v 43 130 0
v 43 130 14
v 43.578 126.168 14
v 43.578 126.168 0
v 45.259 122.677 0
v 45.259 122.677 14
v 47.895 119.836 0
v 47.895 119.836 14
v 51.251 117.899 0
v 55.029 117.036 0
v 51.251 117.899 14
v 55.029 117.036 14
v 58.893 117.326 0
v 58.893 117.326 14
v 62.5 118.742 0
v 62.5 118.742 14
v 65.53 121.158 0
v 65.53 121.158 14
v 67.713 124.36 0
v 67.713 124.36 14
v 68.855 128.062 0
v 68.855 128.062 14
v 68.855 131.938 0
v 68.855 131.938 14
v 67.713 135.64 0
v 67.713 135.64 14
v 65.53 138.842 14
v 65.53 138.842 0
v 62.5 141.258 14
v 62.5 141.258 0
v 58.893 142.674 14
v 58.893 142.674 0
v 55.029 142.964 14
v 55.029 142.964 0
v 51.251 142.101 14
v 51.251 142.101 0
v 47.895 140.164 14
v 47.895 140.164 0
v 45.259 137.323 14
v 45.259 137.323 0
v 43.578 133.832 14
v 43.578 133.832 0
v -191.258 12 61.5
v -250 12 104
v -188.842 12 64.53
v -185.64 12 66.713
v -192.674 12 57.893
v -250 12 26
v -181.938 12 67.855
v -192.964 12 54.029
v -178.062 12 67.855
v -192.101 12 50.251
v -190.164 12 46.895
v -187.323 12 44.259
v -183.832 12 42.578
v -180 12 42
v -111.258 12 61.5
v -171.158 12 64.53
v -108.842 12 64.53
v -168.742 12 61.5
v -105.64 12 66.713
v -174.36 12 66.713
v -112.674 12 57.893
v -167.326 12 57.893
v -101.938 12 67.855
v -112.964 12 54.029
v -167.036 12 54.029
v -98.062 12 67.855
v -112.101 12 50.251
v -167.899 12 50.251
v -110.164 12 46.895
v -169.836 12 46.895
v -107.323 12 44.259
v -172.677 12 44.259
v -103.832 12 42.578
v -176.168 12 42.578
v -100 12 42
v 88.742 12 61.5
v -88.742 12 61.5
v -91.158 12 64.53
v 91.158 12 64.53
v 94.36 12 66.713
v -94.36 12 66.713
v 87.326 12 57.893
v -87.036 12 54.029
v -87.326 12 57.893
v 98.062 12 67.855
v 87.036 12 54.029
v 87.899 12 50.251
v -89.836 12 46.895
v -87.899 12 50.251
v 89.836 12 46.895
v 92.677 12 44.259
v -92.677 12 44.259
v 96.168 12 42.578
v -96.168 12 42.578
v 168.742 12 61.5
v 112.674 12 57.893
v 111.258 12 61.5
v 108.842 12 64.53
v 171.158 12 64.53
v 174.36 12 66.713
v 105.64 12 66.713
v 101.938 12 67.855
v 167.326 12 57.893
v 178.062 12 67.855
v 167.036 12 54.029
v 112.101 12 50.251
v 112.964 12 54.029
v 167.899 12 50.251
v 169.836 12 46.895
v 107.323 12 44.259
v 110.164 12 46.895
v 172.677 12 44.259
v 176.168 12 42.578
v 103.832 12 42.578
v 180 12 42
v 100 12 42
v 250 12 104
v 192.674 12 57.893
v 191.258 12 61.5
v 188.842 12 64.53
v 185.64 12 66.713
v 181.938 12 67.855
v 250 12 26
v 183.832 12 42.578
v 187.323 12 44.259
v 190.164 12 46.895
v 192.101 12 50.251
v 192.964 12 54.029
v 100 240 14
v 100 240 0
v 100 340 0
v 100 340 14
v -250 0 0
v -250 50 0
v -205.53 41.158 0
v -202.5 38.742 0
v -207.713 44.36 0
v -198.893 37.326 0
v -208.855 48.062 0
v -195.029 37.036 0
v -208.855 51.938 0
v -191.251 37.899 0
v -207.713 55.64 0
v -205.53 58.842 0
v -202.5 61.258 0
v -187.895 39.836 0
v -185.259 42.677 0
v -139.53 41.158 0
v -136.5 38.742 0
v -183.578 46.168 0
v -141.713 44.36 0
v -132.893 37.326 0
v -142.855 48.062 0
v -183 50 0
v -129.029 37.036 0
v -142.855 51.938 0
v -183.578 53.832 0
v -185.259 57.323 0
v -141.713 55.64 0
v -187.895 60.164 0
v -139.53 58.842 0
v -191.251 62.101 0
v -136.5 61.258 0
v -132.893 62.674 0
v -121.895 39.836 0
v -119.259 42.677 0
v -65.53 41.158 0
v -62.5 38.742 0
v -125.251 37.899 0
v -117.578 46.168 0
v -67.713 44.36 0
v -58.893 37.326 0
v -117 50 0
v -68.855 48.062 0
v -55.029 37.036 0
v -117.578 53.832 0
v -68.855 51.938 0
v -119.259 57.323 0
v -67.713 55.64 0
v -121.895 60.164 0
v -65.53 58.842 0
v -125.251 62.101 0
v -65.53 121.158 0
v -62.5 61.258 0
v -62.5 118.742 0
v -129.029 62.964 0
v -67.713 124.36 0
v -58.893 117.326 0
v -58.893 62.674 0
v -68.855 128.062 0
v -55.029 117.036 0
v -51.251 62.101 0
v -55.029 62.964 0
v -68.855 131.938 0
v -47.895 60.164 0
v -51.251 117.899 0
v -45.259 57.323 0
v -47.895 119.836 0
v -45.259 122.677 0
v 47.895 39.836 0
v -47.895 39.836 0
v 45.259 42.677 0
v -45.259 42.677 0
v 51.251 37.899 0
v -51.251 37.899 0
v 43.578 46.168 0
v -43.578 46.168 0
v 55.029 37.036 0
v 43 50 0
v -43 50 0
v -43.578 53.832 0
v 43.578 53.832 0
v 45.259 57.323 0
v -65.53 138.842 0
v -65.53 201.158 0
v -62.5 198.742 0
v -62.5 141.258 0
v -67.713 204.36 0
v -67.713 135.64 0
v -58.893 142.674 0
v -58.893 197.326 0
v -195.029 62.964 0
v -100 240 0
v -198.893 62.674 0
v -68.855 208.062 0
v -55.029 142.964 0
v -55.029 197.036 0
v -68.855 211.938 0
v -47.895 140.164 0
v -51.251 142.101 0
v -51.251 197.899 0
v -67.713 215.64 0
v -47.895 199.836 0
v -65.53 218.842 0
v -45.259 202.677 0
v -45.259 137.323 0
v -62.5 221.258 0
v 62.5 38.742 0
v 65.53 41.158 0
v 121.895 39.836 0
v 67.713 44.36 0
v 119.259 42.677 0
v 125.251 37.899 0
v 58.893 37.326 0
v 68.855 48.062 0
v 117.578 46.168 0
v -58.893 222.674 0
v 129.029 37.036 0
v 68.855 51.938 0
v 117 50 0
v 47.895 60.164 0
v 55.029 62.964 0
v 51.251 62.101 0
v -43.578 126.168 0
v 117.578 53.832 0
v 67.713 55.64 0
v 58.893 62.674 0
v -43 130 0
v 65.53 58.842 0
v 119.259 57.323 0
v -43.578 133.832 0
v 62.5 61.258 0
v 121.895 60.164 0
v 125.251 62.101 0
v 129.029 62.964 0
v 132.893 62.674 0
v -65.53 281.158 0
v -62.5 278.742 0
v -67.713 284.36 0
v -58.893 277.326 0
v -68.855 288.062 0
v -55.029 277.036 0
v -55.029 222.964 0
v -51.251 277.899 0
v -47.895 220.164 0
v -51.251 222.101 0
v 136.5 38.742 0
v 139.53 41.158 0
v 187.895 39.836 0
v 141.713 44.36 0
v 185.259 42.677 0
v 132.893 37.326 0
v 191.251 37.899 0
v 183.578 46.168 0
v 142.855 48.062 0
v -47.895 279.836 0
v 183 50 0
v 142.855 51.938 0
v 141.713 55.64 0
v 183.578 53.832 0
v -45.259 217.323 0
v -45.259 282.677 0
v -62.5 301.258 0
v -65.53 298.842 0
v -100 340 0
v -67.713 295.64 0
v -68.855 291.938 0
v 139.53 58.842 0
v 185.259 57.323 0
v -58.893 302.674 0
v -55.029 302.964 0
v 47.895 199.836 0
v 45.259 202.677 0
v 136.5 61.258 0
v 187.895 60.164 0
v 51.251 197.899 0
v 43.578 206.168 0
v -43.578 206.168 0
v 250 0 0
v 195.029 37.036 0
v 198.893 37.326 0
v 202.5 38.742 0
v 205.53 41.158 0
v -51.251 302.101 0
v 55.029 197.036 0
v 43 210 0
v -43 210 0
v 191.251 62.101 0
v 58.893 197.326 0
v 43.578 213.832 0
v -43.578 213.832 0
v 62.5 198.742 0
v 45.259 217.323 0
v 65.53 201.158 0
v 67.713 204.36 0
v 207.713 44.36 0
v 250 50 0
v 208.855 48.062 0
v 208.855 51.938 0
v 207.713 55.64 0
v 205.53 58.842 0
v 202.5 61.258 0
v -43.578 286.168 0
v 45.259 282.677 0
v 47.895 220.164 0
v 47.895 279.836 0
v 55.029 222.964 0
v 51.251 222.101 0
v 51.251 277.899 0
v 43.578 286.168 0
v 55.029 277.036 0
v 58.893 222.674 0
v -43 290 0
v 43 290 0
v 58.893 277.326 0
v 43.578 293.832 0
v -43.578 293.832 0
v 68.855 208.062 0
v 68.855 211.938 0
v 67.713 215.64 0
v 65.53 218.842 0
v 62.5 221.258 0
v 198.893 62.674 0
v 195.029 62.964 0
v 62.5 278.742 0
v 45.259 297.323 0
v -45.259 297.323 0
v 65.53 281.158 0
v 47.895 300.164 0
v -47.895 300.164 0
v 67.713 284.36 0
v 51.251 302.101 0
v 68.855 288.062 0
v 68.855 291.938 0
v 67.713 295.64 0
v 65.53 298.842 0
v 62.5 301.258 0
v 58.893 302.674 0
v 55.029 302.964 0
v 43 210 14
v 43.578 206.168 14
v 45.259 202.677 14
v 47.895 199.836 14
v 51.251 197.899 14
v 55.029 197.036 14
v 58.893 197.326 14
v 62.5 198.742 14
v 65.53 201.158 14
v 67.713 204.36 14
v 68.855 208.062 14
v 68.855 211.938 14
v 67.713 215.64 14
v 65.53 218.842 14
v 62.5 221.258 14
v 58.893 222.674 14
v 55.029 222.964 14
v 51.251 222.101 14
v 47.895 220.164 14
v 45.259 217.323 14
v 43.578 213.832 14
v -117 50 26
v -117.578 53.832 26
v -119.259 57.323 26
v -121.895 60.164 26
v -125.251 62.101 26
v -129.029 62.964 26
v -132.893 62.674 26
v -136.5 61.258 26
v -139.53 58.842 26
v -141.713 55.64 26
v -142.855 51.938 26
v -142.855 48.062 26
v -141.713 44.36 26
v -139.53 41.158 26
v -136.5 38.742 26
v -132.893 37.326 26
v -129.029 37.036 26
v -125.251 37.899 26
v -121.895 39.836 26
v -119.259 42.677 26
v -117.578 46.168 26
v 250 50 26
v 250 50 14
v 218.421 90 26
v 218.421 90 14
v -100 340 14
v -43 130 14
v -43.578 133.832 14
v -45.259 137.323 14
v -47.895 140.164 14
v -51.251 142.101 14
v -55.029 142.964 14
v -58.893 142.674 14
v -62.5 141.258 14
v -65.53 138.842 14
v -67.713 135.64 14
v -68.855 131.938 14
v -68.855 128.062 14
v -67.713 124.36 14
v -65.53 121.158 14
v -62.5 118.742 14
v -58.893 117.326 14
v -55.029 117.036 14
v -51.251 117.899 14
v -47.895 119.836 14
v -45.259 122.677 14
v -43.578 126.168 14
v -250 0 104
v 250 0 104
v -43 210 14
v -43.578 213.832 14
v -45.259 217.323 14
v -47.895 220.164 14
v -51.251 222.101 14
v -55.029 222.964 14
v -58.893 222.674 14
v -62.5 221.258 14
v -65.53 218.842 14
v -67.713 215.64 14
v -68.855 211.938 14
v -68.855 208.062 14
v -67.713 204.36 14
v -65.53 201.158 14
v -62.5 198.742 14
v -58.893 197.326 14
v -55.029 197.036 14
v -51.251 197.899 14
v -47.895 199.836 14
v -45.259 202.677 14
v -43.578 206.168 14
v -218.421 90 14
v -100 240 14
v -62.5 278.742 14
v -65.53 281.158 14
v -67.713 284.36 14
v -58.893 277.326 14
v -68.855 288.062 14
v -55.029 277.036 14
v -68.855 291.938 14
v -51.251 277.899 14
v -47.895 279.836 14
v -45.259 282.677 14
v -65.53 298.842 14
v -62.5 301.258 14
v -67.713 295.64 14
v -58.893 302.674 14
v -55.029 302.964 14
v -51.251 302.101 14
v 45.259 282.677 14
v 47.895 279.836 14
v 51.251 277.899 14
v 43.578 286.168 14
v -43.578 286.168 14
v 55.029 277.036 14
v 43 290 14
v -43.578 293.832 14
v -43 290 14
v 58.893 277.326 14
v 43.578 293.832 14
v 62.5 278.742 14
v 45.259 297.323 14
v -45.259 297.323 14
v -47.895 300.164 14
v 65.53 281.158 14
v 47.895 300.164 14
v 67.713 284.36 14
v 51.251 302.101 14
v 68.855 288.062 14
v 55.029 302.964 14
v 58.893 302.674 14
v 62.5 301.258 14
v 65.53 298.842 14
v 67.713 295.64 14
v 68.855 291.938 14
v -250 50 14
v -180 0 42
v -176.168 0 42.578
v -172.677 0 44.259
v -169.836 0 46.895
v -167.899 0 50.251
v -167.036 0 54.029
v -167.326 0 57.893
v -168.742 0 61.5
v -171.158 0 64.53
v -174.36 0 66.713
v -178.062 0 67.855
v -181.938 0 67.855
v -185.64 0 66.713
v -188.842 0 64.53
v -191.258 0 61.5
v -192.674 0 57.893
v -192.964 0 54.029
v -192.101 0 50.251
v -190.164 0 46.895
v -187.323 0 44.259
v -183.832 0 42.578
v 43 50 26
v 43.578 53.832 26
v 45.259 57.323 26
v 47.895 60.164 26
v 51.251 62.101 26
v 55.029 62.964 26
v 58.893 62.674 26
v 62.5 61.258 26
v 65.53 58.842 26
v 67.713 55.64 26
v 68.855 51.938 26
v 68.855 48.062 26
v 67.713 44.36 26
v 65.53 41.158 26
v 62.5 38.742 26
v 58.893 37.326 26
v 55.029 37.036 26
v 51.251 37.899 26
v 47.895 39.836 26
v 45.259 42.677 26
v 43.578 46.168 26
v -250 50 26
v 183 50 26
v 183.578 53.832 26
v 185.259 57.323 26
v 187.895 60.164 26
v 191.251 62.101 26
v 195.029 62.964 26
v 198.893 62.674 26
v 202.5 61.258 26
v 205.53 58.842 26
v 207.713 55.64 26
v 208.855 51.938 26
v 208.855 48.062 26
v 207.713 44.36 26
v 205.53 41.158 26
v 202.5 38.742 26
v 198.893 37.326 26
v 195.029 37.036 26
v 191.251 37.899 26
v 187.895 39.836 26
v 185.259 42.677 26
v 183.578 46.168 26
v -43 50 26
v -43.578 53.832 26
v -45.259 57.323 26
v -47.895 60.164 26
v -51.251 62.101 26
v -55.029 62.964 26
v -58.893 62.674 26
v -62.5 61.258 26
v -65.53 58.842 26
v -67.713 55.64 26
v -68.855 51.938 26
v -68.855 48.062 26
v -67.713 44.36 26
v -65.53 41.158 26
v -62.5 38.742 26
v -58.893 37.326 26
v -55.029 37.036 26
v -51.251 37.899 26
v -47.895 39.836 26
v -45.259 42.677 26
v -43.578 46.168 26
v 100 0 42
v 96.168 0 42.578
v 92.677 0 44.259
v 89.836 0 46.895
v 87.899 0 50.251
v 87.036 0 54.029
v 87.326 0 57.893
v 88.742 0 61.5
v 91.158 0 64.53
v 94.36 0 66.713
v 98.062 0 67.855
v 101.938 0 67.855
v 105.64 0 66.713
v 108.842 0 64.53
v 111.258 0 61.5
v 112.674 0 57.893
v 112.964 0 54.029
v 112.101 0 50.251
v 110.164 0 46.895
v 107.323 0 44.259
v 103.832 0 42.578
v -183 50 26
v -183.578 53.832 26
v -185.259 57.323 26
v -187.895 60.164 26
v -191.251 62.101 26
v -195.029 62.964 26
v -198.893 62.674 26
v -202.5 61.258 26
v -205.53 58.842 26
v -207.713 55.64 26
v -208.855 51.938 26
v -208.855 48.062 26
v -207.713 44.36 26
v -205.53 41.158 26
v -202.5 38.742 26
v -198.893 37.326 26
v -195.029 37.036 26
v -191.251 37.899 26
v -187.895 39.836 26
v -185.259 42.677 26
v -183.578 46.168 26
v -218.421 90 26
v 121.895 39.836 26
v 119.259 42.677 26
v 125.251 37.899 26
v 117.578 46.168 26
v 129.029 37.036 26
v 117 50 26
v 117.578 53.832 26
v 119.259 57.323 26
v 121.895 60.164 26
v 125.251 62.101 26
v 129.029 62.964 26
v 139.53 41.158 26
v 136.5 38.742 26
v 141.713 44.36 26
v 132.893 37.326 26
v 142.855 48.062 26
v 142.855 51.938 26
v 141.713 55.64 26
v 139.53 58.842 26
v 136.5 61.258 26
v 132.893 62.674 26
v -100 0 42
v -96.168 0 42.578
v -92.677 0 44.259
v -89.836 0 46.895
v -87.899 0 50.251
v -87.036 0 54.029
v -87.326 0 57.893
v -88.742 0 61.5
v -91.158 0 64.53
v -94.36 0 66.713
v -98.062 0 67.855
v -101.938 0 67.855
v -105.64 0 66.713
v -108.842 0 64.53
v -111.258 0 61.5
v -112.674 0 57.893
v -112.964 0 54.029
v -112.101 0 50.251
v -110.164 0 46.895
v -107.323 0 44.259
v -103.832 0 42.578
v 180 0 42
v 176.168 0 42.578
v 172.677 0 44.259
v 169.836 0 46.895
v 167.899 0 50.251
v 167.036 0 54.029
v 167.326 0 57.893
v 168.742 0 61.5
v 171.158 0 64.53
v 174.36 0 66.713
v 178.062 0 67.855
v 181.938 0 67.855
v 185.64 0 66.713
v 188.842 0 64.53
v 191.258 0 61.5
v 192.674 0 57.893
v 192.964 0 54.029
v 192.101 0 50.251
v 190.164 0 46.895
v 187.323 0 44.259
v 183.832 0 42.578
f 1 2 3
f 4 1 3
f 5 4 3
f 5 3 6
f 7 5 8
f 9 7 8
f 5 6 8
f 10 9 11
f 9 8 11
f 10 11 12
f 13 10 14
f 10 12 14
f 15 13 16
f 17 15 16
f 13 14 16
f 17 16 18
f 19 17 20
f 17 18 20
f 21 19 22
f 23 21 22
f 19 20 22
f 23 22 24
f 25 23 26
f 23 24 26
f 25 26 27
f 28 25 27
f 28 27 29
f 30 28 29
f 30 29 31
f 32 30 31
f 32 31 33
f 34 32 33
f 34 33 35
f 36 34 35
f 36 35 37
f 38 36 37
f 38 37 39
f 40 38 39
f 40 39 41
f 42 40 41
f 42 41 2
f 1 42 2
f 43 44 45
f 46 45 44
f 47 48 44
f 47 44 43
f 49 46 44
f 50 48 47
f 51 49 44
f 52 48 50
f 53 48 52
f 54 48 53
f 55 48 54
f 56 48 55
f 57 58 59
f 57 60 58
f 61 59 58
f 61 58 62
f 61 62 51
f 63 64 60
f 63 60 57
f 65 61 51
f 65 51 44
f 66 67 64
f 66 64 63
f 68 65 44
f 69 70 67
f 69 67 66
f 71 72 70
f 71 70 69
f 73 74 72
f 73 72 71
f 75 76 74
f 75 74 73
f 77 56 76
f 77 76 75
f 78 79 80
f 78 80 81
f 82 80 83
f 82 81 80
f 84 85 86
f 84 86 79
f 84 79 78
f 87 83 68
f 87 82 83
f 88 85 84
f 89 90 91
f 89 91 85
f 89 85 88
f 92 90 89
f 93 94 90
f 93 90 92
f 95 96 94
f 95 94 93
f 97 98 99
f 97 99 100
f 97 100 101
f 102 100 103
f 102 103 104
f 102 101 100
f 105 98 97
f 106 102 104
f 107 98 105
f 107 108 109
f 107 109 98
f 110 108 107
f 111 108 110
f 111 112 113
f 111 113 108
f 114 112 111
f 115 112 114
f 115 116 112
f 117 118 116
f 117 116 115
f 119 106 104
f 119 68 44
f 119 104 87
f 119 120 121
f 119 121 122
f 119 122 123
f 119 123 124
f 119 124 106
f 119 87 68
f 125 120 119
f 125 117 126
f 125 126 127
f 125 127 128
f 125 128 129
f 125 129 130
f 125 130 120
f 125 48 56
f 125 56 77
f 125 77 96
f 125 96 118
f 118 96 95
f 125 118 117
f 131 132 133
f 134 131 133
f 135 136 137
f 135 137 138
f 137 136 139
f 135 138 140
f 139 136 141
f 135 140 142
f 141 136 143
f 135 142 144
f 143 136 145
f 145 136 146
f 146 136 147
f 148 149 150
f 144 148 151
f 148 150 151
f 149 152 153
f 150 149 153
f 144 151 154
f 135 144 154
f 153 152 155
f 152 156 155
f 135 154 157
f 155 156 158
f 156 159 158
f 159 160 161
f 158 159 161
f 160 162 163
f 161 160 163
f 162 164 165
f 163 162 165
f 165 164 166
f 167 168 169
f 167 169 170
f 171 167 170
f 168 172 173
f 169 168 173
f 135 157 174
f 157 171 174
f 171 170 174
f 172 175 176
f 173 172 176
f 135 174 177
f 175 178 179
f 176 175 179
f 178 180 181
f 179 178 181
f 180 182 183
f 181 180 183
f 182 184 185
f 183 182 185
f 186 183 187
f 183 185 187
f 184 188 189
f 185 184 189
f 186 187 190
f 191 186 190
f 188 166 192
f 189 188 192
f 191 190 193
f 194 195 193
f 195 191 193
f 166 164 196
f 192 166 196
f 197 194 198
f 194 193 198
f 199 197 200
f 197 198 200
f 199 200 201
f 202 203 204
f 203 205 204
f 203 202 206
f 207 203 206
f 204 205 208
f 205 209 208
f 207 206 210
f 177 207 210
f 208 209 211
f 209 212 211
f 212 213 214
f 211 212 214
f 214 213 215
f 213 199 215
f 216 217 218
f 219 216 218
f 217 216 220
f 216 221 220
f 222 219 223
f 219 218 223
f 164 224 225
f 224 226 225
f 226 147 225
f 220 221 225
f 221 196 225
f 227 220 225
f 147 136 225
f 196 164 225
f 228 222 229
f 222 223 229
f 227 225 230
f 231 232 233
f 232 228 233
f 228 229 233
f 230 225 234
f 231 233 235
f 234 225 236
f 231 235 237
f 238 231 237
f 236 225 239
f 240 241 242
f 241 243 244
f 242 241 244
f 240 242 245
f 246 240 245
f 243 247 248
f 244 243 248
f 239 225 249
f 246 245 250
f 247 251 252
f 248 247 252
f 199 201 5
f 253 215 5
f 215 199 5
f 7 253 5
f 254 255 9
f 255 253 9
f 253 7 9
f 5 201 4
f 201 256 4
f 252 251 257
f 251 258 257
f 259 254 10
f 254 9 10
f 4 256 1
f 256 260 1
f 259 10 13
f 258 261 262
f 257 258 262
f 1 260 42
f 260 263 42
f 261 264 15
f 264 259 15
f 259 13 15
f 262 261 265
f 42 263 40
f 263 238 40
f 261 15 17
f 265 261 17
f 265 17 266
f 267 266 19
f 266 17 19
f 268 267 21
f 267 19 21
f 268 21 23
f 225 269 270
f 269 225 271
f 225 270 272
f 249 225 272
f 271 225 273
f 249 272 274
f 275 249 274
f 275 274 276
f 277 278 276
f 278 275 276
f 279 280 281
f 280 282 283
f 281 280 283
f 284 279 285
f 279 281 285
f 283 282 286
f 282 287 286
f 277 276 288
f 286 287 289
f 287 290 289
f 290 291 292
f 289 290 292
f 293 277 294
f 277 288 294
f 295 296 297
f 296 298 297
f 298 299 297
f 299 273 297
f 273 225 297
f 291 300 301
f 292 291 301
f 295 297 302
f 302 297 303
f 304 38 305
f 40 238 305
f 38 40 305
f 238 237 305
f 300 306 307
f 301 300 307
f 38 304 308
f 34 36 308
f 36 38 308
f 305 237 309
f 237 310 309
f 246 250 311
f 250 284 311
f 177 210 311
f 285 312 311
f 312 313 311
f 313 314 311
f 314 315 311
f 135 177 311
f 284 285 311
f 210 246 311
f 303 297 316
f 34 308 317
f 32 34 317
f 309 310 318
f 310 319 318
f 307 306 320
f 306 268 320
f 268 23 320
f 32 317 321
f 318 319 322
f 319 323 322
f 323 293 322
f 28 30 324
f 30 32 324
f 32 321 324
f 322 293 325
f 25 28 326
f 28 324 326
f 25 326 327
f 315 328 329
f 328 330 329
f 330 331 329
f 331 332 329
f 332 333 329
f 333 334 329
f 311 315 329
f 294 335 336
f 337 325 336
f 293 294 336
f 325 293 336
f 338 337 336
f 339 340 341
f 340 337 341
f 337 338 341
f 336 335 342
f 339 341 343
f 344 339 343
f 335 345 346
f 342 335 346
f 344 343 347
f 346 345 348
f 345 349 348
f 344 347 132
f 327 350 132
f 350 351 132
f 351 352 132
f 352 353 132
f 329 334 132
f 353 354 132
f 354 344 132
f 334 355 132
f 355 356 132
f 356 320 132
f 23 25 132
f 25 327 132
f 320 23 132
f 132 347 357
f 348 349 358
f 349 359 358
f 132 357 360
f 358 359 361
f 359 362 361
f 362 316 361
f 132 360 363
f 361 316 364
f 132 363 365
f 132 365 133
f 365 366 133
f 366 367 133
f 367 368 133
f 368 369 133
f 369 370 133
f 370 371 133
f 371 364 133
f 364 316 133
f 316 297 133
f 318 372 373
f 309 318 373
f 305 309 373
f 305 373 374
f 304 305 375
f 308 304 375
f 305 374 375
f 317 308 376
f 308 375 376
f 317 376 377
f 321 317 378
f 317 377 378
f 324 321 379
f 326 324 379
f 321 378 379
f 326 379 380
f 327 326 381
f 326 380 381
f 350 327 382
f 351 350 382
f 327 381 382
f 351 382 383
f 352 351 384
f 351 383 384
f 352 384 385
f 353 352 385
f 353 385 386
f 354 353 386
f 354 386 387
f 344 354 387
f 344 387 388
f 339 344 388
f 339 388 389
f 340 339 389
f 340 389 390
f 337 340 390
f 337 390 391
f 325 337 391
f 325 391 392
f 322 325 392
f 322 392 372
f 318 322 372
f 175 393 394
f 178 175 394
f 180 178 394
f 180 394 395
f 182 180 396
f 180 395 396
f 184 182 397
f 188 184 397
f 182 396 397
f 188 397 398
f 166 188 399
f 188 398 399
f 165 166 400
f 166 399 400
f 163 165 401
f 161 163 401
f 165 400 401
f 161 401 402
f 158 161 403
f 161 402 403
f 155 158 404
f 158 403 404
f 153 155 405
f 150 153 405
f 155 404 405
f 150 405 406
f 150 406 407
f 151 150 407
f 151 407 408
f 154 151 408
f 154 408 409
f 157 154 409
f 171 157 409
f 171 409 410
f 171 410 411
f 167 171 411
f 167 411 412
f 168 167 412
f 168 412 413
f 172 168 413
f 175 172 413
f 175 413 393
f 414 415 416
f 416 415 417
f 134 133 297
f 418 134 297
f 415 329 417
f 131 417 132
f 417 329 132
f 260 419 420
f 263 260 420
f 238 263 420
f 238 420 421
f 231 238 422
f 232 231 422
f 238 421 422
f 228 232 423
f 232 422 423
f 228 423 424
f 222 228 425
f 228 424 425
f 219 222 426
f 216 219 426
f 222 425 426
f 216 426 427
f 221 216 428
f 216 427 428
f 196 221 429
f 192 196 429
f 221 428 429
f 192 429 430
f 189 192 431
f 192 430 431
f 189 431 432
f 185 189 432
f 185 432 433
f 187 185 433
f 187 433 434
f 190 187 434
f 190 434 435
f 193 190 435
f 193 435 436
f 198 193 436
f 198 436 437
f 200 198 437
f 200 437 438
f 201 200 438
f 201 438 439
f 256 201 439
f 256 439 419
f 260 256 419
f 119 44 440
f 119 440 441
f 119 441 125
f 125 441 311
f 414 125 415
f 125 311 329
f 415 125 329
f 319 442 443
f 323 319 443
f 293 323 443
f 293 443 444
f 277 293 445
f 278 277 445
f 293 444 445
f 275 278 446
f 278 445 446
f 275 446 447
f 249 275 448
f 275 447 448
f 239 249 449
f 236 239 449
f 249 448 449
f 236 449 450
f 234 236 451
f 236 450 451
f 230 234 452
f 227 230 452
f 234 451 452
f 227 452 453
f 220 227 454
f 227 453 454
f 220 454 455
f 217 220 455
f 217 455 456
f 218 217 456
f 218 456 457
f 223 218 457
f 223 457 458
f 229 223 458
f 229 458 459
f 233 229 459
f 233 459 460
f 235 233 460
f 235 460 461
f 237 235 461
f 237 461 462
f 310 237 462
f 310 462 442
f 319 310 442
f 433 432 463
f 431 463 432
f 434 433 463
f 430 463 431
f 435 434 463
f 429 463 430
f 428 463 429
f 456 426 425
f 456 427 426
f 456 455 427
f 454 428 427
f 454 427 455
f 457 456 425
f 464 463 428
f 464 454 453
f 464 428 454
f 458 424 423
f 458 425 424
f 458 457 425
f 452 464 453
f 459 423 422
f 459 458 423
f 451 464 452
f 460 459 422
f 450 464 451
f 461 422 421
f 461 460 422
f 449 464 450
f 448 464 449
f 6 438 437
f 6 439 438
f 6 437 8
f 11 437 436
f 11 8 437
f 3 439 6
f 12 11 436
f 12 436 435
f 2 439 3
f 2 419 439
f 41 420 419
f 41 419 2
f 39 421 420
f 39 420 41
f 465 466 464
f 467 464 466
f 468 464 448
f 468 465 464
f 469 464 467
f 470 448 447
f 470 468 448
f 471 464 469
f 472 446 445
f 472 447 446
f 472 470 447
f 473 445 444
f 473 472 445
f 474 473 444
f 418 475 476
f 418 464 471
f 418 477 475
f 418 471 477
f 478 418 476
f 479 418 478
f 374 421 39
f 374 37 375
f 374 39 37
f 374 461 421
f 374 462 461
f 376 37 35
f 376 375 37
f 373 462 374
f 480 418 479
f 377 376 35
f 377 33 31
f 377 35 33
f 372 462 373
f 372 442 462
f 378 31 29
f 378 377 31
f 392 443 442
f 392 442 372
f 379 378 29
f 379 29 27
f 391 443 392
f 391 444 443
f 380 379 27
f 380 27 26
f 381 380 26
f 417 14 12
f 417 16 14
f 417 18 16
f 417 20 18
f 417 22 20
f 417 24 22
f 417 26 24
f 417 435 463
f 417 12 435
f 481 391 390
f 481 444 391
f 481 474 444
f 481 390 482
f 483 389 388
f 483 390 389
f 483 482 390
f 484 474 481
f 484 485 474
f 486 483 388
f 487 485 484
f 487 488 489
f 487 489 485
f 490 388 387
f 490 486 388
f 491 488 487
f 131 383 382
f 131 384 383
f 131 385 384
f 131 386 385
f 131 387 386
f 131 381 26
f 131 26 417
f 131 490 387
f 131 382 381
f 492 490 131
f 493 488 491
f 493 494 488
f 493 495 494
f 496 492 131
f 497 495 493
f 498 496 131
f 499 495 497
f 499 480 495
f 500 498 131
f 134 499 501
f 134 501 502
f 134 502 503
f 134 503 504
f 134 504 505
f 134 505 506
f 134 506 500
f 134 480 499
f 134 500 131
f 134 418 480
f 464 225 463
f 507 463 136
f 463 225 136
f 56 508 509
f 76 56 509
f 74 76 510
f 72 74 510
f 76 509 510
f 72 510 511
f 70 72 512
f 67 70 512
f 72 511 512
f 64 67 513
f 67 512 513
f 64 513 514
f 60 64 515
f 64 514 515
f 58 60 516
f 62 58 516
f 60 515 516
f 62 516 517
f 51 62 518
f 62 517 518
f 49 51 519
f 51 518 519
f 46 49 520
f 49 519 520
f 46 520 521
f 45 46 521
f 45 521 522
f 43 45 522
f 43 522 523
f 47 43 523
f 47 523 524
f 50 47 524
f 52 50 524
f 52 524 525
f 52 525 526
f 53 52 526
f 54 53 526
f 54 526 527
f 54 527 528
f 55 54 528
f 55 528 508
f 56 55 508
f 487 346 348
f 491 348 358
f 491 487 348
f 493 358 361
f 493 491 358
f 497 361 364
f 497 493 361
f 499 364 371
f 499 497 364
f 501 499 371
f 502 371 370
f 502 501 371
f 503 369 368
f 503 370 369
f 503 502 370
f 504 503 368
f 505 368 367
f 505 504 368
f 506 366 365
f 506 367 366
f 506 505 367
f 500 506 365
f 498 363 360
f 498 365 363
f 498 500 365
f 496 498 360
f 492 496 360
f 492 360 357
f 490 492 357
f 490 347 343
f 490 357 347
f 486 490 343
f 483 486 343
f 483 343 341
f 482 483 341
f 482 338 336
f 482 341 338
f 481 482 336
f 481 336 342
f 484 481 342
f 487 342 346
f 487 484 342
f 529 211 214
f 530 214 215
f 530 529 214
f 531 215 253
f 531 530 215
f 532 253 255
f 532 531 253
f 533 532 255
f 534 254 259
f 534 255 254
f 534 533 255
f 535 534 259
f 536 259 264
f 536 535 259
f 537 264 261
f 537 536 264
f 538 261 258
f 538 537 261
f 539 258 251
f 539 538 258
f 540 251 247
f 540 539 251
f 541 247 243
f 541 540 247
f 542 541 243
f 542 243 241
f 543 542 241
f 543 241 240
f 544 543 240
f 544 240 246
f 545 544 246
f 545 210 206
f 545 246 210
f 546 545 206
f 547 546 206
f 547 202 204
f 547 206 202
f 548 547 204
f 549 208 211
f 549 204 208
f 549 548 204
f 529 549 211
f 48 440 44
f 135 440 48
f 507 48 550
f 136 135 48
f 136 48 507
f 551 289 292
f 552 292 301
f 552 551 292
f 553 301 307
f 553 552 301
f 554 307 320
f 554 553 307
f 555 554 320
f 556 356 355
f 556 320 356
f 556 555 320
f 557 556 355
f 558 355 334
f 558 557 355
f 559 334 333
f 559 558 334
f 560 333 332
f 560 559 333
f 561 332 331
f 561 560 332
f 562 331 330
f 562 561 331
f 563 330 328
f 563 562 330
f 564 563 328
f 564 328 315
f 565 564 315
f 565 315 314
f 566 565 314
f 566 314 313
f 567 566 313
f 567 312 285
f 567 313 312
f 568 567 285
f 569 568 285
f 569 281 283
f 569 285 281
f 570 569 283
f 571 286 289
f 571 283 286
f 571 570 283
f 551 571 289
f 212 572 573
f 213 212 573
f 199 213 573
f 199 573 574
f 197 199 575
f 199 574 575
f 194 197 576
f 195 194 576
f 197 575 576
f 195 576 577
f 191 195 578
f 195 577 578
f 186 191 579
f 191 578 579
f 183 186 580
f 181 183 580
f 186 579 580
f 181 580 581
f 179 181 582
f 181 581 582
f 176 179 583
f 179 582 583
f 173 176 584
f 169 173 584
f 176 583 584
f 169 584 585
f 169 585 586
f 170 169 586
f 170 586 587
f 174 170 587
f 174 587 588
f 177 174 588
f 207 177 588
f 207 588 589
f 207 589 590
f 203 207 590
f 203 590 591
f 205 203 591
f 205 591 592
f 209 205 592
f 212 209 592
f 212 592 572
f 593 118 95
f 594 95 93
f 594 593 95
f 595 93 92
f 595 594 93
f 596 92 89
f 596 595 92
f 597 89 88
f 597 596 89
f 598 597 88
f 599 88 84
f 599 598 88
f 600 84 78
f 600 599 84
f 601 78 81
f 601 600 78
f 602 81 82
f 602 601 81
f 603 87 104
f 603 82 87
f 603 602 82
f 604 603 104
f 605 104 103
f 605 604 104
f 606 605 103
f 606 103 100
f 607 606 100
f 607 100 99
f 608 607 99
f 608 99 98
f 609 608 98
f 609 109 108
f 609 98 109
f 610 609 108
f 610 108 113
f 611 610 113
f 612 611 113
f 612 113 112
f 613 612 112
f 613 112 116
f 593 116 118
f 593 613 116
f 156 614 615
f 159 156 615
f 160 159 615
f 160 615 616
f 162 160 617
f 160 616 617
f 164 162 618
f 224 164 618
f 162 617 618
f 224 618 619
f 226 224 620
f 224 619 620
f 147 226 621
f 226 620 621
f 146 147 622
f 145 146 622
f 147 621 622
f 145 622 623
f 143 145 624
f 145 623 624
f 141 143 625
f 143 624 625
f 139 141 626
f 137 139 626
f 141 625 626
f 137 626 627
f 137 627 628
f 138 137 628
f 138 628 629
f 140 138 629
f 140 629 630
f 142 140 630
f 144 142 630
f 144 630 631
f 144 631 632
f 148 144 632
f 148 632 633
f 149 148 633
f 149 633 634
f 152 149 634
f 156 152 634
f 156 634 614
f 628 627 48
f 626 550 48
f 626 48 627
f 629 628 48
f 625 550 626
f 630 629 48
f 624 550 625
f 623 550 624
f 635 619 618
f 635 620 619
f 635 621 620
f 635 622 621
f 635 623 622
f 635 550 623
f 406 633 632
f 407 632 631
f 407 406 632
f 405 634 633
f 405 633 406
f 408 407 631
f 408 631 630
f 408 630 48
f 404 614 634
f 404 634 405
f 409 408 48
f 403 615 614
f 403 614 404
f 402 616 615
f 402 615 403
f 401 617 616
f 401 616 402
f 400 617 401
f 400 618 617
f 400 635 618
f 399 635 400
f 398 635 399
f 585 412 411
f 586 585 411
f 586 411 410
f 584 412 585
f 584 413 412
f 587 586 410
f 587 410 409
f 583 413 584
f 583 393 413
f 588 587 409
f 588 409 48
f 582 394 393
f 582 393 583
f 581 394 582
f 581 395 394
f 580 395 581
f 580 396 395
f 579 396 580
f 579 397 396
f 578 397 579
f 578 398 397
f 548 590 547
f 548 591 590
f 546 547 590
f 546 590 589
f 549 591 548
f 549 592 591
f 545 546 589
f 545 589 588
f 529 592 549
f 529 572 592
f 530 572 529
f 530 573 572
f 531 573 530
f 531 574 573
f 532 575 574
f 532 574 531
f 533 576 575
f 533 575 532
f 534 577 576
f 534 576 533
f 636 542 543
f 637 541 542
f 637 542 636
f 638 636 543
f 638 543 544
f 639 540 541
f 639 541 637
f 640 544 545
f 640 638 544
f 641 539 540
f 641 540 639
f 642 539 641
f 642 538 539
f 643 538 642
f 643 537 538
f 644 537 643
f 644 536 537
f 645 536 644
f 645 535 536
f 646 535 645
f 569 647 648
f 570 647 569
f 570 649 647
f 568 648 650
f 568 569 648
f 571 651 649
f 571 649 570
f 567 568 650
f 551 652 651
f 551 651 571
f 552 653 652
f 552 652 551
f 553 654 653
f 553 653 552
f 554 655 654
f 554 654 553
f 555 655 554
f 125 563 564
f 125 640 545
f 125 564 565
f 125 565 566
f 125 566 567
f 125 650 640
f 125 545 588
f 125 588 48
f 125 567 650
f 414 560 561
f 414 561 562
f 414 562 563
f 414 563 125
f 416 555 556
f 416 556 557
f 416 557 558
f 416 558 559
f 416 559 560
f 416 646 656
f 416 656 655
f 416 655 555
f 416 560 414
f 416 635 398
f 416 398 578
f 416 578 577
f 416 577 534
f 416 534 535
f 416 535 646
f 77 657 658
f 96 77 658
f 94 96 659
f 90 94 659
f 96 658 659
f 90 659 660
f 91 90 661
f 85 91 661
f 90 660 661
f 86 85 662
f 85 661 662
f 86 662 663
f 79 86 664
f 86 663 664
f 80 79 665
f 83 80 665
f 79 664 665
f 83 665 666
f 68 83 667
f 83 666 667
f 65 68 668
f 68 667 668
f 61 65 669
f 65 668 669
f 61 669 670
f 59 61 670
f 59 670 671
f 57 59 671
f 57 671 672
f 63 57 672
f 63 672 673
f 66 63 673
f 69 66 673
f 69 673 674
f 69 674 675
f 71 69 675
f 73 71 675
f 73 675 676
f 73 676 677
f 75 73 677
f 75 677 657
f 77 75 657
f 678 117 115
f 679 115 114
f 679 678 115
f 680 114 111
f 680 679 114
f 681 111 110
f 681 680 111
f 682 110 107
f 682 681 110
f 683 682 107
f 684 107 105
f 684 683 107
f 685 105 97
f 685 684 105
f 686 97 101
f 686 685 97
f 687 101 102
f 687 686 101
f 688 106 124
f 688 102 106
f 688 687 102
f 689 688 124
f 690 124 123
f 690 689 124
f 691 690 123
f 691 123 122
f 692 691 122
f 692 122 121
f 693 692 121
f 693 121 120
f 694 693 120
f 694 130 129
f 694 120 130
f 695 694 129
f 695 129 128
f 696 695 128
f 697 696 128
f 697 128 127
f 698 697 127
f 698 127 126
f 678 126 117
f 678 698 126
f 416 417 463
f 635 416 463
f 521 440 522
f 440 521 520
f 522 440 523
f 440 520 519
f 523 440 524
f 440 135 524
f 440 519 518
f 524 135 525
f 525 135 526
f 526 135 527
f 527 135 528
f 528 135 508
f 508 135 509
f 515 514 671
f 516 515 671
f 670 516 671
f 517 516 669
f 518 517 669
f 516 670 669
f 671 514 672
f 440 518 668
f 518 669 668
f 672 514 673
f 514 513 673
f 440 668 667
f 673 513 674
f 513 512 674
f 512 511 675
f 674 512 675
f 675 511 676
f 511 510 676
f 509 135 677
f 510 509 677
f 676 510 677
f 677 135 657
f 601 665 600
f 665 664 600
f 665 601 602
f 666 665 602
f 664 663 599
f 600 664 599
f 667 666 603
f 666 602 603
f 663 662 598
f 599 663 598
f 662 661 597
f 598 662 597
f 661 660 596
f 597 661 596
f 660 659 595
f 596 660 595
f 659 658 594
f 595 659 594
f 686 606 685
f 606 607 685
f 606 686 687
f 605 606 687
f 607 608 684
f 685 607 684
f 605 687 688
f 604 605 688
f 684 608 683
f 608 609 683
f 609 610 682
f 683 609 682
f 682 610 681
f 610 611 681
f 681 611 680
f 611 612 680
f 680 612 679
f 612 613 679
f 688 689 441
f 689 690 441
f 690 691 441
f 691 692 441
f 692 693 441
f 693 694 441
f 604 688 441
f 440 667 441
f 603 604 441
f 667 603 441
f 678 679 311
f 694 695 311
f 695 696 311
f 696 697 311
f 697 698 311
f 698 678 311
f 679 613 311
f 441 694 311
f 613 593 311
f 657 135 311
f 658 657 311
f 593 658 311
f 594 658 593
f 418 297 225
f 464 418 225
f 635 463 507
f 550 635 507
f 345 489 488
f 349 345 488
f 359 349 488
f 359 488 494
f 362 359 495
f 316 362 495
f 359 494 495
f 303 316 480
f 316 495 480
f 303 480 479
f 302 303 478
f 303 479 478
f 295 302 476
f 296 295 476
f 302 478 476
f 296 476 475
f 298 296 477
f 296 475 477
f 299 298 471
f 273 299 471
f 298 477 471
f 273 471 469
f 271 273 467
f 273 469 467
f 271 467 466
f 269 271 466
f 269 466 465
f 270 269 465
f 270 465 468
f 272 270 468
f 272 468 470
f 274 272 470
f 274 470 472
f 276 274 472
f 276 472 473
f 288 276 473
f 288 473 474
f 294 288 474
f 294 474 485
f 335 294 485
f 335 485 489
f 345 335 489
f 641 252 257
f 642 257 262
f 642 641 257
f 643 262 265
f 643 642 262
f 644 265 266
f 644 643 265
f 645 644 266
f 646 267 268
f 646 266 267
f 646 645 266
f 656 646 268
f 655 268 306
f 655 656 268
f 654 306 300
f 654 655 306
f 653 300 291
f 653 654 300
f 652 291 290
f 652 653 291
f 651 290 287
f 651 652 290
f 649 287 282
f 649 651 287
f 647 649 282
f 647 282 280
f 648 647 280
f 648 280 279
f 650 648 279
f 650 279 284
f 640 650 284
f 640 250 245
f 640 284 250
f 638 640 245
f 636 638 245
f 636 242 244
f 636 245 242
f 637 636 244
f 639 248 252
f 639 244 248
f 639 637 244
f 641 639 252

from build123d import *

# Parameters (mm, degrees)
EXTRUDE_1_DEPTH          = 14
SKETCH_3_R               = 13
CUT_EXTRUDE_1_DEPTH      = 423.251110123
PATTERN_LINEAR_1_COUNT   = 3
PATTERN_LINEAR_1_PITCH   = 80
MIRROR_1_COPY_1_SKETCH_R = 13
MIRROR_1_COPY_1_DEPTH    = 423.251110123
MIRROR_1_COPY_2_SKETCH_R = 13
MIRROR_1_COPY_2_DEPTH    = 423.251110123
EXTRUDE_2_DEPTH          = 12
SKETCH_7_R               = 13
CUT_EXTRUDE_2_DEPTH      = 423.819110259
SKETCH_8_W               = 500
SKETCH_8_H               = 12
EXTRUDE_5_DEPTH          = 78
SKETCH_9_R               = 13
CUT_EXTRUDE_3_DEPTH      = 435.644682471


with BuildPart() as part:
    # 草图1 → 凸台-拉伸1 (new body)
    with BuildSketch(Plane.XY):
        Polygon((0, 0), (250, 0), (250, 50), (100, 240), (100, 340), (0, 340), (-100, 340), (-100, 240), (-250, 50), (-250, 0), align=None)
    extrude(amount=EXTRUDE_1_DEPTH)

    # 草图3 → 切除-拉伸1 (cut, through all)
    with BuildSketch(Plane.XY.offset(14)):
        with Locations((-56, 290)):
            Circle(SKETCH_3_R)
    cut_extrude_1 = extrude(amount=-CUT_EXTRUDE_1_DEPTH, mode=Mode.SUBTRACT)

    # 阵列(线性)1: 切除-拉伸1 ×3
    with Locations(*[(0, -i * PATTERN_LINEAR_1_PITCH, 0) for i in range(1, PATTERN_LINEAR_1_COUNT)]):
        add(cut_extrude_1, mode=Mode.SUBTRACT)

    # 镜向1: 切除-拉伸1 across plane
    add(cut_extrude_1.mirror(Plane(origin=(0, 0, 0), x_dir=(0, 0, 1), z_dir=(1, 0, 0))), mode=Mode.SUBTRACT)

    # 镜向1 copy 1 sketch → 镜向1 copy 1 (cut, through all)
    with BuildSketch(Plane(origin=(0, -80, 14), x_dir=(-1, 0, 0), z_dir=(0, 0, 1))):
        with Locations((-56, -290)):
            Circle(MIRROR_1_COPY_1_SKETCH_R)
    extrude(amount=-MIRROR_1_COPY_1_DEPTH, mode=Mode.SUBTRACT)

    # 镜向1 copy 2 sketch → 镜向1 copy 2 (cut, through all)
    with BuildSketch(Plane(origin=(0, -160, 14), x_dir=(-1, 0, 0), z_dir=(0, 0, 1))):
        with Locations((-56, -290)):
            Circle(MIRROR_1_COPY_2_SKETCH_R)
    extrude(amount=-MIRROR_1_COPY_2_DEPTH, mode=Mode.SUBTRACT)

    # 草图6 → 凸台-拉伸2 (add)
    with BuildSketch(Plane.XY.offset(14)):
        Polygon((218.421052632, 90), (-218.421052632, 90), (-250, 50), (-250, 0), (250, 0), (250, 50), align=None)
    extrude(amount=EXTRUDE_2_DEPTH)

    # 草图7 → 切除-拉伸2 (cut, through all)
    with BuildSketch(Plane.XY.offset(26)):
        with Locations((-56, 50)):
            Circle(SKETCH_7_R)
        with Locations((-130, 50)):
            Circle(SKETCH_7_R)
        with Locations((-196, 50)):
            Circle(SKETCH_7_R)
    cut_extrude_2 = extrude(amount=-CUT_EXTRUDE_2_DEPTH, mode=Mode.SUBTRACT)

    # 镜向2: 切除-拉伸2 across plane
    add(cut_extrude_2.mirror(Plane(origin=(0, 0, 0), x_dir=(0, 0, 1), z_dir=(1, 0, 0))), mode=Mode.SUBTRACT)

    # 草图8 → 凸台-拉伸5 (add)
    with BuildSketch(Plane.XY.offset(26)):
        with Locations((0, 6)):
            Rectangle(SKETCH_8_W, SKETCH_8_H)
    extrude(amount=EXTRUDE_5_DEPTH)

    # 草图9 → 切除-拉伸3 (cut, through all)
    with BuildSketch(Plane.XZ):
        with Locations(Location((-180, 55, 0), (0, 0, 270))):
            Circle(SKETCH_9_R)
        with Locations(Location((-100, 55, 0), (0, 0, 270))):
            Circle(SKETCH_9_R)
    cut_extrude_3 = extrude(amount=-CUT_EXTRUDE_3_DEPTH, mode=Mode.SUBTRACT)

    # 镜向3: 切除-拉伸3 across plane
    add(cut_extrude_3.mirror(Plane(origin=(0, 0, 0), x_dir=(0, 0, 1), z_dir=(1, 0, 0))), mode=Mode.SUBTRACT)


solid = part.part
